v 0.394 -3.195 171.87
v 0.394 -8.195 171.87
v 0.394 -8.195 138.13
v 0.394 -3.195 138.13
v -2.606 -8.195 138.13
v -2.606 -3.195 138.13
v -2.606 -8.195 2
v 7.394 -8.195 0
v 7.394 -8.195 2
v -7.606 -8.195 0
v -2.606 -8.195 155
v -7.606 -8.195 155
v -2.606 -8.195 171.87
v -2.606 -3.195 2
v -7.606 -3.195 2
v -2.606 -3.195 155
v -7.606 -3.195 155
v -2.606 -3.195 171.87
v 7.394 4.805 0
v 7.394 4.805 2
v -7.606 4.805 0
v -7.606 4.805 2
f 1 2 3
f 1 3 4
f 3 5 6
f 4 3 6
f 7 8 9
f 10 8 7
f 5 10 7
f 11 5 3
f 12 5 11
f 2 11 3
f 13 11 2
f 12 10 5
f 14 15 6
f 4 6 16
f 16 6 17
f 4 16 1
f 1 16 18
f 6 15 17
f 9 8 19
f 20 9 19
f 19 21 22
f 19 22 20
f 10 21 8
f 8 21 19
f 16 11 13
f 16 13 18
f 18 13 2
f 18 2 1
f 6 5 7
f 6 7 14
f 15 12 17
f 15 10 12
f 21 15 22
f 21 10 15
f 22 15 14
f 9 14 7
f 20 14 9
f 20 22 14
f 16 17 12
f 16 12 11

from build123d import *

# Parameters (mm, degrees)
SKETCH007_W  = 15
SKETCH007_H  = 13
PAD007_DEPTH = 2
SKETCH008_W  = 5
SKETCH008_H  = 5
PAD008_DEPTH = 153
SKETCH009_W  = 5
SKETCH009_H  = 33.74
PAD009_DEPTH = 3


with BuildPart() as part:
    # Sketch007 → Pad007 (new body)
    with BuildSketch(Plane.XY):
        with Locations((-0.106383, -1.694786)):
            Rectangle(SKETCH007_W, SKETCH007_H)
    extrude(amount=PAD007_DEPTH)

    # Sketch008 (on Face6 of Pad007) → Pad008 (join)
    with BuildSketch(Plane.XY.offset(2)):
        with Locations((-5.106383, -5.694786)):
            Rectangle(SKETCH008_W, SKETCH008_H)
    extrude(amount=PAD008_DEPTH)

    # Sketch009 (on Face5 of Pad008) → Pad009 (join)
    with BuildSketch(Plane.YZ.offset(-2.606383)):
        with Locations((-5.694786, 155)):
            Rectangle(SKETCH009_W, SKETCH009_H)
    extrude(amount=PAD009_DEPTH)


solid = part.part
